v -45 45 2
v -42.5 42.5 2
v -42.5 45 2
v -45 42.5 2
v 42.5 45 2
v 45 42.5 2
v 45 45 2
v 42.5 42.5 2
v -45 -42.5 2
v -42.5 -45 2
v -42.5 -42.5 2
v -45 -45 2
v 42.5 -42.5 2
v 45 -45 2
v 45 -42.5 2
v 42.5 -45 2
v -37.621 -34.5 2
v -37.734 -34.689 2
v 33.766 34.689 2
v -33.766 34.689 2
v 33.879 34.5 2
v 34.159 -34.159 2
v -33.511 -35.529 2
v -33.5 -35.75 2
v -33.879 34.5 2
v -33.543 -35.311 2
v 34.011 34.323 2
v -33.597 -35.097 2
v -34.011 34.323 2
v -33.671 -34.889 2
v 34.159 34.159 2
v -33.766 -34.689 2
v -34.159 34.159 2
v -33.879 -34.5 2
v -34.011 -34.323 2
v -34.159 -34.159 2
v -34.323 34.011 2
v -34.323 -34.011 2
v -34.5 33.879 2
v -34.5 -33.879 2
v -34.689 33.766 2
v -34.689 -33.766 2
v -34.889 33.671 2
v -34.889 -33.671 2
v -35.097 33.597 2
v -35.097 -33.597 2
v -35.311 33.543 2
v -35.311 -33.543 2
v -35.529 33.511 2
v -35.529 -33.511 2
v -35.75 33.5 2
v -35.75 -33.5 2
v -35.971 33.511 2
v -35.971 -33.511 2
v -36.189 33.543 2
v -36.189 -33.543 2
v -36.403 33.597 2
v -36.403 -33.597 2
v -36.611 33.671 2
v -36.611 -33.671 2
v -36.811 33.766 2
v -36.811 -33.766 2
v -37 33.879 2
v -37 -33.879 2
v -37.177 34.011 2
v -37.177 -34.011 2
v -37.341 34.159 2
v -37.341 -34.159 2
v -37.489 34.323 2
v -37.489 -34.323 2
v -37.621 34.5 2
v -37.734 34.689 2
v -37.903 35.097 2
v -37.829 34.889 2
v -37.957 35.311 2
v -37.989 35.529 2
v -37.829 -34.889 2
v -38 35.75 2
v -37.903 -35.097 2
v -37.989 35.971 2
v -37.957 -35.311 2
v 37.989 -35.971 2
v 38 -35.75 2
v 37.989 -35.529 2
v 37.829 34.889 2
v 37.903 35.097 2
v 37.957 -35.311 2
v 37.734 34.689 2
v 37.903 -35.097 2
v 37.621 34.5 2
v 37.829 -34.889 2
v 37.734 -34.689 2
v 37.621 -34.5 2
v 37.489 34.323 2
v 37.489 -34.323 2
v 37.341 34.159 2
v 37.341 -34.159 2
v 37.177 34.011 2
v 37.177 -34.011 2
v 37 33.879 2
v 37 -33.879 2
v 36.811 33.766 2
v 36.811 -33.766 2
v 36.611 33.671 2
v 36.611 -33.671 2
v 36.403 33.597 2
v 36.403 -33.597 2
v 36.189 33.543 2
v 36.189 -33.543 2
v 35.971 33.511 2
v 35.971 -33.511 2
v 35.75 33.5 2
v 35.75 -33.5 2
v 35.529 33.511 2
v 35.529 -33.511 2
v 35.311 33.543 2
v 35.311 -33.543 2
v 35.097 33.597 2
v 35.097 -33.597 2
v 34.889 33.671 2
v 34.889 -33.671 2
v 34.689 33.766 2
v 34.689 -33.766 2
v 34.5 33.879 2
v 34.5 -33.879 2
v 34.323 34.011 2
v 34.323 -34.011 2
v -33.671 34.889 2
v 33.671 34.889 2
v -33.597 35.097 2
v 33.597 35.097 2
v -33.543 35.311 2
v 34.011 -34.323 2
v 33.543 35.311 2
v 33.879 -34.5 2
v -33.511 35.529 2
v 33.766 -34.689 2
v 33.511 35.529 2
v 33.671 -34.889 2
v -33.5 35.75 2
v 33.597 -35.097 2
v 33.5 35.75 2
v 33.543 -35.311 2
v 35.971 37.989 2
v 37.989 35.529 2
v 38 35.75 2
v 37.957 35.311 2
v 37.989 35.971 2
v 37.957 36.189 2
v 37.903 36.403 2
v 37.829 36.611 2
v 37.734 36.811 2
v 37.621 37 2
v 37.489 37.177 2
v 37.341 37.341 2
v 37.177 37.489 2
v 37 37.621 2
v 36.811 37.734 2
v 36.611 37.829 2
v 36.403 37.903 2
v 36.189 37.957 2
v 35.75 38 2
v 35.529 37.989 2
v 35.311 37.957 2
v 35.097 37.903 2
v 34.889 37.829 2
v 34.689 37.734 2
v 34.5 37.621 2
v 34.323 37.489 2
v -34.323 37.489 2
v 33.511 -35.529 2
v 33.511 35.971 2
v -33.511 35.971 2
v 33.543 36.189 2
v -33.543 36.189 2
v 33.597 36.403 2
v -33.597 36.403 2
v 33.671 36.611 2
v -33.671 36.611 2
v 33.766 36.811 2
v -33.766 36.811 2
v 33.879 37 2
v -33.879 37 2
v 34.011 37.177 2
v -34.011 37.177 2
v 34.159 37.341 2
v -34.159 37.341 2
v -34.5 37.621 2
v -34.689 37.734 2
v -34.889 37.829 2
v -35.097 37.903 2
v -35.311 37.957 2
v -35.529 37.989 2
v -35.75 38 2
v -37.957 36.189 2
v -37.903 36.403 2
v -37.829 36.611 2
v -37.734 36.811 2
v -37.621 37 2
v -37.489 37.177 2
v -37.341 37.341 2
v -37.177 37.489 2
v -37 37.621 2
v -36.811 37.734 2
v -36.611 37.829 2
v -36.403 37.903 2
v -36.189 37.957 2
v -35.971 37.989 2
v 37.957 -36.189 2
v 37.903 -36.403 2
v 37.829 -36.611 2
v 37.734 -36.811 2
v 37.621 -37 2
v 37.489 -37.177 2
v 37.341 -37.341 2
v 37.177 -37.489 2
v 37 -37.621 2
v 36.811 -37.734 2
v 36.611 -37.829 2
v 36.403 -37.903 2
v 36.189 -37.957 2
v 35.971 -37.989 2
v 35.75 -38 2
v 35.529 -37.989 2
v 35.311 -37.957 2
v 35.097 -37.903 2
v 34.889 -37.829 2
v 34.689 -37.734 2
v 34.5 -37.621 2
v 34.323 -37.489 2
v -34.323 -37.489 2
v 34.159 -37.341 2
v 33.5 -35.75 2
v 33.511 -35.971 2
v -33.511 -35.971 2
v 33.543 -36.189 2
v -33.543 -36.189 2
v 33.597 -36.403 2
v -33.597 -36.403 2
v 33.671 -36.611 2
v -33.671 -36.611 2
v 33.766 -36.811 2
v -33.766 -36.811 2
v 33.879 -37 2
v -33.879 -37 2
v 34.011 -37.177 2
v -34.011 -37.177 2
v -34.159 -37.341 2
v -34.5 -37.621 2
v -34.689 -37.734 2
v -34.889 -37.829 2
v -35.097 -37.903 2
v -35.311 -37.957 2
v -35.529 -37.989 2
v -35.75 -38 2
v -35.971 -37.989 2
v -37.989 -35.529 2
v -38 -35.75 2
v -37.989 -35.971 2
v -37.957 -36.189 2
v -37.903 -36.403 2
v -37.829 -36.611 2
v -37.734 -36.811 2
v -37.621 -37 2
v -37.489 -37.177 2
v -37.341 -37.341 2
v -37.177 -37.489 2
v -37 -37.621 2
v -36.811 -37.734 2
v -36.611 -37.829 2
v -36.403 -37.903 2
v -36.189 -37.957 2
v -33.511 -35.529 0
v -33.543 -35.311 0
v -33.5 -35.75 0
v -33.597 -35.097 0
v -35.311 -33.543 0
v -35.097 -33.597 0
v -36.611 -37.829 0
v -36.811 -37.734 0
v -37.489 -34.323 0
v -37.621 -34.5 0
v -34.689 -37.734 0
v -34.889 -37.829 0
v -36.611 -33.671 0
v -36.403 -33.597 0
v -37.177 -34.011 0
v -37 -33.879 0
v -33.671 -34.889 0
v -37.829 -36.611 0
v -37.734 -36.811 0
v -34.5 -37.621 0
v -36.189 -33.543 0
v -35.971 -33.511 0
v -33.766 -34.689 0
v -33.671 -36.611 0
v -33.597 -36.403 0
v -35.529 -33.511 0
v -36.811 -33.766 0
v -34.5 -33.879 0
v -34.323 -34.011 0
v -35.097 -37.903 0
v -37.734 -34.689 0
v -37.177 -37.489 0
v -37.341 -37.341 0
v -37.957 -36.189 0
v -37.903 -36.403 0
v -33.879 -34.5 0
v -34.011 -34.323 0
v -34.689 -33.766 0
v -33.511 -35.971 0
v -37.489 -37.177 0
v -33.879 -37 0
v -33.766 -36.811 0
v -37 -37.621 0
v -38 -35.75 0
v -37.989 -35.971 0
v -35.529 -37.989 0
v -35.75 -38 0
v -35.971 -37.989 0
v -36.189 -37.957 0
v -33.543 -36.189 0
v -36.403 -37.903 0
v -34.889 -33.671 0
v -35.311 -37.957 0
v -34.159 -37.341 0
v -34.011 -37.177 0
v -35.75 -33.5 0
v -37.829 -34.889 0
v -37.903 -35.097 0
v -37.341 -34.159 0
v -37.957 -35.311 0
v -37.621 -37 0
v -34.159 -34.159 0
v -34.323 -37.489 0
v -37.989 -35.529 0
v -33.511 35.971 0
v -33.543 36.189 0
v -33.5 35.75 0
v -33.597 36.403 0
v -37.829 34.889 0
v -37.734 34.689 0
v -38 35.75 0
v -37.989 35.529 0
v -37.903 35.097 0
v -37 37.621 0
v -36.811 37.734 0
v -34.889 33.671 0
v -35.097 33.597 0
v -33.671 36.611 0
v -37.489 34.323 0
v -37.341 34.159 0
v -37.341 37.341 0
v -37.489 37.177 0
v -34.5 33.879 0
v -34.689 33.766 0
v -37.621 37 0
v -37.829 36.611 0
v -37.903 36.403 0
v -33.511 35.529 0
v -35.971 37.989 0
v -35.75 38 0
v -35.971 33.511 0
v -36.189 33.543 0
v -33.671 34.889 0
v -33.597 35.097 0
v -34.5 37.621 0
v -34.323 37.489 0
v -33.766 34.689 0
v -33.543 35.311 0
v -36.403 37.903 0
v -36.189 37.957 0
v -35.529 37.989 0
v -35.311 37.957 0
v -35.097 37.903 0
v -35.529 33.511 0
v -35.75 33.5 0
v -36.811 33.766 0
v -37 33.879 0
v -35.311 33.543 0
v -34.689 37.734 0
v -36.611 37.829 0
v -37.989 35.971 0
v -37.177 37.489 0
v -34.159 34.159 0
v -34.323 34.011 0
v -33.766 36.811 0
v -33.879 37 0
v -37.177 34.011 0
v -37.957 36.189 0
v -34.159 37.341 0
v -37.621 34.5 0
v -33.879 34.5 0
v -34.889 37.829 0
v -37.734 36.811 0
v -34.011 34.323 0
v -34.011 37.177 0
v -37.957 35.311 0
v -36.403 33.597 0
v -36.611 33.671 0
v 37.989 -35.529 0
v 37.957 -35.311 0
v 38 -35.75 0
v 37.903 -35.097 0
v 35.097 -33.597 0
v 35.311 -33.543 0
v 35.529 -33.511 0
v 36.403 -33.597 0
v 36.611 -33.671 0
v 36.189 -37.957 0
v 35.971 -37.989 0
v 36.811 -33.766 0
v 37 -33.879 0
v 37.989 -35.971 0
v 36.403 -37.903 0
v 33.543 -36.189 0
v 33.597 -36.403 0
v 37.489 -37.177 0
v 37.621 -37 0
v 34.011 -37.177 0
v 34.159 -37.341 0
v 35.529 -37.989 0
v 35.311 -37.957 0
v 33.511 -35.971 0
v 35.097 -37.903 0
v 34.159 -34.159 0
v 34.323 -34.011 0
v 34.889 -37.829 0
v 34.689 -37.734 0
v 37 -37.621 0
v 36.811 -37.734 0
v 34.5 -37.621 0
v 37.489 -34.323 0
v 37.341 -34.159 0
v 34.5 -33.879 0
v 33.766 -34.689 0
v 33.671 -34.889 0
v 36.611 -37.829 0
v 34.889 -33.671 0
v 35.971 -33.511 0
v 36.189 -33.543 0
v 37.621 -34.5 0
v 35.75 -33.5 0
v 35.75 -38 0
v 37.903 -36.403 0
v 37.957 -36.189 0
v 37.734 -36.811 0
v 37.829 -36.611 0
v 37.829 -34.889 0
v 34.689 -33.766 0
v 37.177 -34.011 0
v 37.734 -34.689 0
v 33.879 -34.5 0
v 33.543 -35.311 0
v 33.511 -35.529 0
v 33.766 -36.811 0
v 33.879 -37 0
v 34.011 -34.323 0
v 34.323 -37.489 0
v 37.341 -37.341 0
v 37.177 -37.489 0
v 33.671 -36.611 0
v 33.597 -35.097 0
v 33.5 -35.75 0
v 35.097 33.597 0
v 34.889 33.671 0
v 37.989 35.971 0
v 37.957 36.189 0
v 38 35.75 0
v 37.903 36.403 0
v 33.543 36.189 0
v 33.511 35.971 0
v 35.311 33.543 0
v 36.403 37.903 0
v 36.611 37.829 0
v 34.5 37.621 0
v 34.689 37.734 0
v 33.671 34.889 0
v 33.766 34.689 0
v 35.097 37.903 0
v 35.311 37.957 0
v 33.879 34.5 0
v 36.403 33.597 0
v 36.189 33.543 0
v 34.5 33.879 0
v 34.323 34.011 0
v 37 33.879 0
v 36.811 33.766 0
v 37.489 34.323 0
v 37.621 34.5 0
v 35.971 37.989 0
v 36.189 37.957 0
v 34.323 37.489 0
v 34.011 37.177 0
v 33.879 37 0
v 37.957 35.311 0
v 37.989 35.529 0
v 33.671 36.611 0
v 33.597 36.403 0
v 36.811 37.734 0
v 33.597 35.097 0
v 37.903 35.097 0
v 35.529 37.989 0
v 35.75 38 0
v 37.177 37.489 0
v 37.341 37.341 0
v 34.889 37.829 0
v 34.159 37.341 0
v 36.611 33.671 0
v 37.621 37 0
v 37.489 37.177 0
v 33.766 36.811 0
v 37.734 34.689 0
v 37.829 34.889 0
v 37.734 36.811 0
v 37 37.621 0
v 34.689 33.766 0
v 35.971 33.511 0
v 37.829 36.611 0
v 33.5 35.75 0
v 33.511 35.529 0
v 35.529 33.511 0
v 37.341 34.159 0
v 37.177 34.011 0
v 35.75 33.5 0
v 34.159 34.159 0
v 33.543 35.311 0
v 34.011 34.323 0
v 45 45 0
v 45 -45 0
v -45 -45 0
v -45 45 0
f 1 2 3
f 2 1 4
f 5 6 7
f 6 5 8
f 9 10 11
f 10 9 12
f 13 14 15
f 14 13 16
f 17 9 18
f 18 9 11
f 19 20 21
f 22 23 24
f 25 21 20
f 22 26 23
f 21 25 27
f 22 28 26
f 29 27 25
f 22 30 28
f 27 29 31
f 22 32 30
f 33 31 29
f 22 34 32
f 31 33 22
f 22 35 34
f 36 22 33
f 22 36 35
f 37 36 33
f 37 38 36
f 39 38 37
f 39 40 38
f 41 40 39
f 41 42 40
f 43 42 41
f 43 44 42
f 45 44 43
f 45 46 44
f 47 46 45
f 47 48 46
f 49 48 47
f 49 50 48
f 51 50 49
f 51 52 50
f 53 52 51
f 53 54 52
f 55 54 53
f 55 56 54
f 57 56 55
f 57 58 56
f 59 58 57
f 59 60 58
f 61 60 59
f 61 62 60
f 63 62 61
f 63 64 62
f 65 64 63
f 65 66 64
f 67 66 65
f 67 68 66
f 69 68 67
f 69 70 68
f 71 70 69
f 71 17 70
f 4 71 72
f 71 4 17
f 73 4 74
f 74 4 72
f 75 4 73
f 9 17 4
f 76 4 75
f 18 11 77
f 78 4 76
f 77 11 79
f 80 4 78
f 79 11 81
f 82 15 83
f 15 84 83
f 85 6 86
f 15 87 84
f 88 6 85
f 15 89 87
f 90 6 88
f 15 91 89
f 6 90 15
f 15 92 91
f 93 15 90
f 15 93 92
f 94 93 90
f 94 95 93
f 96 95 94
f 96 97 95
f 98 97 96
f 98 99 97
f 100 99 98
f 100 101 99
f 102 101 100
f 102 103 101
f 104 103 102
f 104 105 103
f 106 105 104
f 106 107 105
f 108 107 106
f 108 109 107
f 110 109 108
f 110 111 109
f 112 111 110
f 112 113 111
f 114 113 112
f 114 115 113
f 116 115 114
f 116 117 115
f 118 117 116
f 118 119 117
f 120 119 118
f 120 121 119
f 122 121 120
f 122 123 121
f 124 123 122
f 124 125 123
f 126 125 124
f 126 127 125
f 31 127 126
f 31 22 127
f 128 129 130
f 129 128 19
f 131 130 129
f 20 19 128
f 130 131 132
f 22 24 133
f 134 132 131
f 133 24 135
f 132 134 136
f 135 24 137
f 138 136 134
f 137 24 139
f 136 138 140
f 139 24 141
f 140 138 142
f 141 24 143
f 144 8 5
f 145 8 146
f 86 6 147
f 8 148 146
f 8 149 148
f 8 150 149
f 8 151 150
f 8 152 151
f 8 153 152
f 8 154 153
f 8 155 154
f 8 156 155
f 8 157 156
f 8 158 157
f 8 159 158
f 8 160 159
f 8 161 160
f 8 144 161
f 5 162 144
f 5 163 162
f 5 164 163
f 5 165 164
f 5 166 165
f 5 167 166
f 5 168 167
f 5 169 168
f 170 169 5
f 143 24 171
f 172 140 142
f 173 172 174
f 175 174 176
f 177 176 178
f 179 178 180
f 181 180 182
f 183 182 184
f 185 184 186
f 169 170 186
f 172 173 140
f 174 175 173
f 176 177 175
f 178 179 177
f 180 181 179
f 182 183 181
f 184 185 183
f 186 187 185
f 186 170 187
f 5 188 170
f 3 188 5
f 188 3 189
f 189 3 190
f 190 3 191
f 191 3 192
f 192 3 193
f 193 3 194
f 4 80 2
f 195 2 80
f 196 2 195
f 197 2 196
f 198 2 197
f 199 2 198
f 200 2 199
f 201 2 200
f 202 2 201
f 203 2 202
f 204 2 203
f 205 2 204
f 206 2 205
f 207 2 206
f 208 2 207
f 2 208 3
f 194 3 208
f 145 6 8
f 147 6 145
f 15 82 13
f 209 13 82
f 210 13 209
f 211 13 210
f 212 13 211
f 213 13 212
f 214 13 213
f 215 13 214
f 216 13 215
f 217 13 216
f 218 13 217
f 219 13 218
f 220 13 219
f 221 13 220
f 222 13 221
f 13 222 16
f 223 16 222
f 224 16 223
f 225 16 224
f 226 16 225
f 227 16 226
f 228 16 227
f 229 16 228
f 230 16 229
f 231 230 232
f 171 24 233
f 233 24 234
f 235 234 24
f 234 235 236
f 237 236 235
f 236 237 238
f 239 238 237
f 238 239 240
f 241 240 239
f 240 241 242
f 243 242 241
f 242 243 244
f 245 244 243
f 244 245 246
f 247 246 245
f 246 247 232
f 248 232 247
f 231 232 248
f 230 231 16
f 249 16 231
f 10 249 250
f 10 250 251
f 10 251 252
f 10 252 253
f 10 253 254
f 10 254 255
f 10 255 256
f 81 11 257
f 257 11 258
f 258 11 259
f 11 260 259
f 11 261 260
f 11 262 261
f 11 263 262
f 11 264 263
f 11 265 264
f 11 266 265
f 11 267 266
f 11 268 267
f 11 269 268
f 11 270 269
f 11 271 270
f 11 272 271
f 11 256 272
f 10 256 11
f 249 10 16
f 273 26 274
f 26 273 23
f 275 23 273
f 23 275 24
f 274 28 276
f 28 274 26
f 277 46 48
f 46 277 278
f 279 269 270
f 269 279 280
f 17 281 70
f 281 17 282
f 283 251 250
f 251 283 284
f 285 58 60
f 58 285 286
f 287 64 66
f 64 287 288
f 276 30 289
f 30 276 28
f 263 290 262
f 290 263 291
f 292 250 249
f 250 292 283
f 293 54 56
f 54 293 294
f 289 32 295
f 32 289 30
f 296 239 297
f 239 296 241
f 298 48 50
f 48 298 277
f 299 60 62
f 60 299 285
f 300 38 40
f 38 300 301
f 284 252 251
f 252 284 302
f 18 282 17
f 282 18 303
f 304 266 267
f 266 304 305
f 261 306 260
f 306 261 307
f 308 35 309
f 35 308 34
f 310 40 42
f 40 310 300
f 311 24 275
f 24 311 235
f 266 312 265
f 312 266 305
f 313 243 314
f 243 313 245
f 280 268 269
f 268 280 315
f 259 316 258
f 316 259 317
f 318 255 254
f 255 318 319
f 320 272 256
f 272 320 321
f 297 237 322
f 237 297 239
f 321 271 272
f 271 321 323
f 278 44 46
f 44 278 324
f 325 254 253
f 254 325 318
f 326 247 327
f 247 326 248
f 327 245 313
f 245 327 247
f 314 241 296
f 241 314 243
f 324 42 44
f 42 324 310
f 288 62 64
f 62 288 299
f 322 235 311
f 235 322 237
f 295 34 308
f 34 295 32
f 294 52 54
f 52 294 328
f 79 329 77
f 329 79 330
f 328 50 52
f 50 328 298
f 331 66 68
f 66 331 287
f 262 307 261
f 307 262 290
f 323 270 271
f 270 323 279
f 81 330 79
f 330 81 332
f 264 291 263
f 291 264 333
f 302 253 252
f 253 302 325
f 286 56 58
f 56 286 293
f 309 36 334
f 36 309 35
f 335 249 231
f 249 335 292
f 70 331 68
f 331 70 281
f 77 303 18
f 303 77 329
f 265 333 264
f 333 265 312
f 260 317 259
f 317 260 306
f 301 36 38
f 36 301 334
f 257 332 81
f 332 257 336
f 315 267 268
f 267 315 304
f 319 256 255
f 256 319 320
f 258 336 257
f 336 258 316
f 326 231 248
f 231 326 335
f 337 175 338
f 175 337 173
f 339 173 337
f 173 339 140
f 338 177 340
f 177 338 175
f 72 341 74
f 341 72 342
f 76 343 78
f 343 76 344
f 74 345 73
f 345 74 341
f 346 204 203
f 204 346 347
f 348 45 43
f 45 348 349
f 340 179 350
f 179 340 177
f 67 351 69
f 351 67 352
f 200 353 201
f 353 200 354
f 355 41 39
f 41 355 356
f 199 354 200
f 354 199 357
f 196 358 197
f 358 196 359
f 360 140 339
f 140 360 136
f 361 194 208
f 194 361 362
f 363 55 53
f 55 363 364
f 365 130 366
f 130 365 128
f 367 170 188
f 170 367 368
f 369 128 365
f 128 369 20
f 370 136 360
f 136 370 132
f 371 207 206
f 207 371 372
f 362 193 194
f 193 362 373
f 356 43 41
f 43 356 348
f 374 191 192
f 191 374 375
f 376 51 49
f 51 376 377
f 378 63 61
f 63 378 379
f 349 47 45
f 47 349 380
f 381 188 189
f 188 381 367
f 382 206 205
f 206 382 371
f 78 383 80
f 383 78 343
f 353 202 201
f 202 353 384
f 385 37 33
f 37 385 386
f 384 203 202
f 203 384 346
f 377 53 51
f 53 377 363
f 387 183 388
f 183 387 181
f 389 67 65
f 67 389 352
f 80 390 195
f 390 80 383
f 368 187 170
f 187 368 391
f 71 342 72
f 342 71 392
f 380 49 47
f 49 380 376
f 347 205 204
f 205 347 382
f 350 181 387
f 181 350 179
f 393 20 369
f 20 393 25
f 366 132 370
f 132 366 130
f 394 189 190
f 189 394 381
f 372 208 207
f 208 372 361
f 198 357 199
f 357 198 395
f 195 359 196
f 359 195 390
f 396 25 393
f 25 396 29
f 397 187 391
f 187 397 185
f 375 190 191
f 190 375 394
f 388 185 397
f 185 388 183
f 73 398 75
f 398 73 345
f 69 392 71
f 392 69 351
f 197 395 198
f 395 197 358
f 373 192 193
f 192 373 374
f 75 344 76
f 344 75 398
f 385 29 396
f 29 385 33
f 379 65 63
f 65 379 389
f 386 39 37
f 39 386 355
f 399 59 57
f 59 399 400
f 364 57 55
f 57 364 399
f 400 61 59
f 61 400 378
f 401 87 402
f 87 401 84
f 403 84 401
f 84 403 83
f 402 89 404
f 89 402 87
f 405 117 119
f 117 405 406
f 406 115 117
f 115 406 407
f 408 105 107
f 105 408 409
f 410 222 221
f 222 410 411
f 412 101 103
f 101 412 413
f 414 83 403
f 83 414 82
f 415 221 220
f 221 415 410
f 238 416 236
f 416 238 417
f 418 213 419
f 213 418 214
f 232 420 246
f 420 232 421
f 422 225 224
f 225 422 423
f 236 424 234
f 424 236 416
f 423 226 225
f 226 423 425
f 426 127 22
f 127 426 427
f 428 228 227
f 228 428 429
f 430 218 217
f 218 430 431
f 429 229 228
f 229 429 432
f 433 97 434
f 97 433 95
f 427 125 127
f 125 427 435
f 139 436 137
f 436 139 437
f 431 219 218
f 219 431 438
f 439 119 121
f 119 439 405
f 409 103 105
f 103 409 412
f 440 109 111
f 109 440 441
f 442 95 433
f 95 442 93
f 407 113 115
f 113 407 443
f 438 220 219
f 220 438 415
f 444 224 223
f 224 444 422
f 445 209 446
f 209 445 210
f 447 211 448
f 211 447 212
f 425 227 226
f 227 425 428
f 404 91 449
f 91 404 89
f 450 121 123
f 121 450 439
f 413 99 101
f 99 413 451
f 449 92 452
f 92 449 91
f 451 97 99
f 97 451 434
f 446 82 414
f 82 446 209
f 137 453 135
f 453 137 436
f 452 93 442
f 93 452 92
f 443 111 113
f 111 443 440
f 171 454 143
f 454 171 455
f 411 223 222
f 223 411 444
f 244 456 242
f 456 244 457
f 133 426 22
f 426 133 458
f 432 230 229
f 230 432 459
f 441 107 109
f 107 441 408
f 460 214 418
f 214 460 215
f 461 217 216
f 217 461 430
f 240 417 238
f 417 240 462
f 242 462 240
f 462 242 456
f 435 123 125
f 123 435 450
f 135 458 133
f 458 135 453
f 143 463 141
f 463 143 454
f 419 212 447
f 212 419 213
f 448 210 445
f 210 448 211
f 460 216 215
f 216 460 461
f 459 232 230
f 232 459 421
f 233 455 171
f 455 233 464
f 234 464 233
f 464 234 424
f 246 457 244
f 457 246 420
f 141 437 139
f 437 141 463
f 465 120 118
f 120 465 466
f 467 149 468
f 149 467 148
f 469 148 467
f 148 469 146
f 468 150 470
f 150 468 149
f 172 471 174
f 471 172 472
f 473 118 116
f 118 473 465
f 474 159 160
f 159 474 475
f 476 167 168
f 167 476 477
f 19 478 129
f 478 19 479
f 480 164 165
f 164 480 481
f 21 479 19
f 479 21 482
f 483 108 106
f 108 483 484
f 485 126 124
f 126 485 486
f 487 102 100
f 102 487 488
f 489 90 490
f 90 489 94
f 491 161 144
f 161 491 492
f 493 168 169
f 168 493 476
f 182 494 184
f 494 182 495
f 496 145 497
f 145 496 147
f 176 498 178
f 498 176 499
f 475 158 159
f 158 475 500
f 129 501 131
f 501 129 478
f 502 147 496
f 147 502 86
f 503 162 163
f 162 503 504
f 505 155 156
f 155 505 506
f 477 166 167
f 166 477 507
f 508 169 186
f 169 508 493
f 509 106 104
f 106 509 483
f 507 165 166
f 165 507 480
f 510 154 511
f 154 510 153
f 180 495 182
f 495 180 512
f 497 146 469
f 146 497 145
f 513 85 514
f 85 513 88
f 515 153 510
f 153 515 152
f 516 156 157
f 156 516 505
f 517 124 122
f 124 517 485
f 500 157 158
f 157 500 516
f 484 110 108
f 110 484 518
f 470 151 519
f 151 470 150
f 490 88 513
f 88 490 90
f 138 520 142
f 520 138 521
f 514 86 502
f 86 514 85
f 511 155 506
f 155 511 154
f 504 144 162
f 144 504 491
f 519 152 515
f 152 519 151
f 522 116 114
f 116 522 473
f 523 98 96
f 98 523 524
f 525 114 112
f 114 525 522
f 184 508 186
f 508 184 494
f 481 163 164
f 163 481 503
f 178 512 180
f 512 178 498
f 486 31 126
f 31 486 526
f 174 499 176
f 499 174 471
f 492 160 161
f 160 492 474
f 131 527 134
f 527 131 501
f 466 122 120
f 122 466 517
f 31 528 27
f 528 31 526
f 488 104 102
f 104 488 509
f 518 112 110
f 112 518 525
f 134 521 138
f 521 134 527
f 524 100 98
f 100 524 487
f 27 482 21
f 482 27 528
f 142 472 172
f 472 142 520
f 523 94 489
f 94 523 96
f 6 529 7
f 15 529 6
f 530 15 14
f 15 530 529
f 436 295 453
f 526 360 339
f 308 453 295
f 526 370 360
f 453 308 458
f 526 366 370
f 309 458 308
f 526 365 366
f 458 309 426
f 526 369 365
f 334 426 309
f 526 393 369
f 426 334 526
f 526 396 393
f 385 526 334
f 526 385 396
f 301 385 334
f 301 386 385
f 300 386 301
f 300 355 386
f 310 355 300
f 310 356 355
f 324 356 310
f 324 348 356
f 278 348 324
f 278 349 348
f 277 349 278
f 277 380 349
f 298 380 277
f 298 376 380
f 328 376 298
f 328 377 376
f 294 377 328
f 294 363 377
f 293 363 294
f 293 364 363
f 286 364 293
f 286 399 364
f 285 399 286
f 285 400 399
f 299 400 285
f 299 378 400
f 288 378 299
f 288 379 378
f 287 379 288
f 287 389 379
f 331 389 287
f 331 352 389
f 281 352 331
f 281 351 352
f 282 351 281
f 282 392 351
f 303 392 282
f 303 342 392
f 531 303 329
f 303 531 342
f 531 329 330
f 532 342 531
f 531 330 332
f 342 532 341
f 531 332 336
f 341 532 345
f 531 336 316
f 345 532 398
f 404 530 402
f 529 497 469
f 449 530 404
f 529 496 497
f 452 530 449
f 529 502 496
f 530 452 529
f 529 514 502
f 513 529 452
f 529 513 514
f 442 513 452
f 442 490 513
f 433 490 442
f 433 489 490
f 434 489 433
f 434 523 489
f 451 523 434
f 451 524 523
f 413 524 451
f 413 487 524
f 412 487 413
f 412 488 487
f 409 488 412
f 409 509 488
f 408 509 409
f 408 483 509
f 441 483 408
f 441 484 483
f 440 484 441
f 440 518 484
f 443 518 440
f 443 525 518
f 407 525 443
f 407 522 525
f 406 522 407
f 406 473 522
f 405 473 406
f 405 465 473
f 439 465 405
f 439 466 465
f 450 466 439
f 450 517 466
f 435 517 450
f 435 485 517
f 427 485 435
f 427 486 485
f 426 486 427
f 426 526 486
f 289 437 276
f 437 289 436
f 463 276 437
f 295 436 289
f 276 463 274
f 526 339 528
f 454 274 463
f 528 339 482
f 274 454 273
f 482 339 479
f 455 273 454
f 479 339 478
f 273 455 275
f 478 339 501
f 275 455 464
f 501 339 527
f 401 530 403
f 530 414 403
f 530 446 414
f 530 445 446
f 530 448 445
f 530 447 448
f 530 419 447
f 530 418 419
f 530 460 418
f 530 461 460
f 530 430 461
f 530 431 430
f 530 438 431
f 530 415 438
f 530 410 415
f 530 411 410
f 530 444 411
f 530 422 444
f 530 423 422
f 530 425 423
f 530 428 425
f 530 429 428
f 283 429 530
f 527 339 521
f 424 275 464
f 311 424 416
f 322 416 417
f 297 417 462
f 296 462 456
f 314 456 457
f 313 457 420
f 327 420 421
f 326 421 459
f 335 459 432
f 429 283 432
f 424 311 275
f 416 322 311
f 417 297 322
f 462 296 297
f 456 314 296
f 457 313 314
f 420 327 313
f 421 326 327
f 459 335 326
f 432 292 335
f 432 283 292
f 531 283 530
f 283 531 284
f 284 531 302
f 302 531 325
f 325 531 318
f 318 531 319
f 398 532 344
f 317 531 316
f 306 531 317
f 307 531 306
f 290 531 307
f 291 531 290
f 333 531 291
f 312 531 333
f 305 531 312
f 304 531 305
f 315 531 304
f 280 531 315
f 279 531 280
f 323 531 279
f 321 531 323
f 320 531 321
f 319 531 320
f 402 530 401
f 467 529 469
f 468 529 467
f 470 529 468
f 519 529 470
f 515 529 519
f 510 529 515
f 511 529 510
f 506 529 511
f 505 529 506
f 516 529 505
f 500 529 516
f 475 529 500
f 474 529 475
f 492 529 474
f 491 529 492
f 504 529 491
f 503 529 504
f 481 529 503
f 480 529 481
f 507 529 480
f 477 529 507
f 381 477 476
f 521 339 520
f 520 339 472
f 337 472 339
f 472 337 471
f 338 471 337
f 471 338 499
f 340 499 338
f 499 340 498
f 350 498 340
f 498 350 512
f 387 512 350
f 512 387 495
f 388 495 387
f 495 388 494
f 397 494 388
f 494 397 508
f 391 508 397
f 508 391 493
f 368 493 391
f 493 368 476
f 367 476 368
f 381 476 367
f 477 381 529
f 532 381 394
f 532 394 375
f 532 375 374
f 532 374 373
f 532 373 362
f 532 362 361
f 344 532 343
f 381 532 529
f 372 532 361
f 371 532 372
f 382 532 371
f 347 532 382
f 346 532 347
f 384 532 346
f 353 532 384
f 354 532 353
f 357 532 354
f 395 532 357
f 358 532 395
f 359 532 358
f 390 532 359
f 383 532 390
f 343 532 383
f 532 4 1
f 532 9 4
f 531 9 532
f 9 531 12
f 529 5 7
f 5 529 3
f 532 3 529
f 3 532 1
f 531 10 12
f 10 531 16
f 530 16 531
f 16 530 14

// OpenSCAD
// DIY magnetic stirrer housing for 80 mm PC case fan
// Print orientation: upside down - top plate on bed, open bottom at fan

// ---- Dimensions (mm) ----
plate_t      = 2;     // top plate thickness
wall_t       = 2.5;   // wall thickness
box_h        = 40;    // wall height (z = 2 to 42)
outer_x      = 90;    // outer size X
outer_y      = 90;    // outer size Y
hole_d       = 4.5;   // M4 screw hole diameter
hole_pitch   = 71.5;  // square hole pattern side
notch_w      = 12;    // cable notch width
notch_depth  = 8;     // cable notch depth from open edge
eps          = 0.5;   // cutter overshoot

$fn = 64;

// ---- Model ----
difference() {
    // Closed top plate (z = 0 to 2)
    translate([-outer_x/2, -outer_y/2, 0])
        cube([outer_x, outer_y, plate_t]);

    // Four walls rising from plate to open top (z = 2 to 42)
    for (dx = [-1, 1], dy = [-1, 1])
        translate([dx > 0 ? outer_x/2 - wall_t : -outer_x/2,
                   dy > 0 ? outer_y/2 - wall_t : -outer_y/2,
                   plate_t])
            cube([wall_t, wall_t, box_h]);

    // Screw holes through top plate, centred square pattern
    for (i = [0 : 1], j = [0 : 1])
        translate([(i - 0.5) * hole_pitch, (j - 0.5) * hole_pitch, -eps])
            cylinder(d = hole_d, h = plate_t + 2*eps);

    // Cable notch in one wall (reaches from open edge down to z = 32)
    translate([outer_x/2 - wall_t, -notch_w/2, plate_t + box_h - notch_depth])
        cube([wall_t, notch_w, notch_depth]);
}
